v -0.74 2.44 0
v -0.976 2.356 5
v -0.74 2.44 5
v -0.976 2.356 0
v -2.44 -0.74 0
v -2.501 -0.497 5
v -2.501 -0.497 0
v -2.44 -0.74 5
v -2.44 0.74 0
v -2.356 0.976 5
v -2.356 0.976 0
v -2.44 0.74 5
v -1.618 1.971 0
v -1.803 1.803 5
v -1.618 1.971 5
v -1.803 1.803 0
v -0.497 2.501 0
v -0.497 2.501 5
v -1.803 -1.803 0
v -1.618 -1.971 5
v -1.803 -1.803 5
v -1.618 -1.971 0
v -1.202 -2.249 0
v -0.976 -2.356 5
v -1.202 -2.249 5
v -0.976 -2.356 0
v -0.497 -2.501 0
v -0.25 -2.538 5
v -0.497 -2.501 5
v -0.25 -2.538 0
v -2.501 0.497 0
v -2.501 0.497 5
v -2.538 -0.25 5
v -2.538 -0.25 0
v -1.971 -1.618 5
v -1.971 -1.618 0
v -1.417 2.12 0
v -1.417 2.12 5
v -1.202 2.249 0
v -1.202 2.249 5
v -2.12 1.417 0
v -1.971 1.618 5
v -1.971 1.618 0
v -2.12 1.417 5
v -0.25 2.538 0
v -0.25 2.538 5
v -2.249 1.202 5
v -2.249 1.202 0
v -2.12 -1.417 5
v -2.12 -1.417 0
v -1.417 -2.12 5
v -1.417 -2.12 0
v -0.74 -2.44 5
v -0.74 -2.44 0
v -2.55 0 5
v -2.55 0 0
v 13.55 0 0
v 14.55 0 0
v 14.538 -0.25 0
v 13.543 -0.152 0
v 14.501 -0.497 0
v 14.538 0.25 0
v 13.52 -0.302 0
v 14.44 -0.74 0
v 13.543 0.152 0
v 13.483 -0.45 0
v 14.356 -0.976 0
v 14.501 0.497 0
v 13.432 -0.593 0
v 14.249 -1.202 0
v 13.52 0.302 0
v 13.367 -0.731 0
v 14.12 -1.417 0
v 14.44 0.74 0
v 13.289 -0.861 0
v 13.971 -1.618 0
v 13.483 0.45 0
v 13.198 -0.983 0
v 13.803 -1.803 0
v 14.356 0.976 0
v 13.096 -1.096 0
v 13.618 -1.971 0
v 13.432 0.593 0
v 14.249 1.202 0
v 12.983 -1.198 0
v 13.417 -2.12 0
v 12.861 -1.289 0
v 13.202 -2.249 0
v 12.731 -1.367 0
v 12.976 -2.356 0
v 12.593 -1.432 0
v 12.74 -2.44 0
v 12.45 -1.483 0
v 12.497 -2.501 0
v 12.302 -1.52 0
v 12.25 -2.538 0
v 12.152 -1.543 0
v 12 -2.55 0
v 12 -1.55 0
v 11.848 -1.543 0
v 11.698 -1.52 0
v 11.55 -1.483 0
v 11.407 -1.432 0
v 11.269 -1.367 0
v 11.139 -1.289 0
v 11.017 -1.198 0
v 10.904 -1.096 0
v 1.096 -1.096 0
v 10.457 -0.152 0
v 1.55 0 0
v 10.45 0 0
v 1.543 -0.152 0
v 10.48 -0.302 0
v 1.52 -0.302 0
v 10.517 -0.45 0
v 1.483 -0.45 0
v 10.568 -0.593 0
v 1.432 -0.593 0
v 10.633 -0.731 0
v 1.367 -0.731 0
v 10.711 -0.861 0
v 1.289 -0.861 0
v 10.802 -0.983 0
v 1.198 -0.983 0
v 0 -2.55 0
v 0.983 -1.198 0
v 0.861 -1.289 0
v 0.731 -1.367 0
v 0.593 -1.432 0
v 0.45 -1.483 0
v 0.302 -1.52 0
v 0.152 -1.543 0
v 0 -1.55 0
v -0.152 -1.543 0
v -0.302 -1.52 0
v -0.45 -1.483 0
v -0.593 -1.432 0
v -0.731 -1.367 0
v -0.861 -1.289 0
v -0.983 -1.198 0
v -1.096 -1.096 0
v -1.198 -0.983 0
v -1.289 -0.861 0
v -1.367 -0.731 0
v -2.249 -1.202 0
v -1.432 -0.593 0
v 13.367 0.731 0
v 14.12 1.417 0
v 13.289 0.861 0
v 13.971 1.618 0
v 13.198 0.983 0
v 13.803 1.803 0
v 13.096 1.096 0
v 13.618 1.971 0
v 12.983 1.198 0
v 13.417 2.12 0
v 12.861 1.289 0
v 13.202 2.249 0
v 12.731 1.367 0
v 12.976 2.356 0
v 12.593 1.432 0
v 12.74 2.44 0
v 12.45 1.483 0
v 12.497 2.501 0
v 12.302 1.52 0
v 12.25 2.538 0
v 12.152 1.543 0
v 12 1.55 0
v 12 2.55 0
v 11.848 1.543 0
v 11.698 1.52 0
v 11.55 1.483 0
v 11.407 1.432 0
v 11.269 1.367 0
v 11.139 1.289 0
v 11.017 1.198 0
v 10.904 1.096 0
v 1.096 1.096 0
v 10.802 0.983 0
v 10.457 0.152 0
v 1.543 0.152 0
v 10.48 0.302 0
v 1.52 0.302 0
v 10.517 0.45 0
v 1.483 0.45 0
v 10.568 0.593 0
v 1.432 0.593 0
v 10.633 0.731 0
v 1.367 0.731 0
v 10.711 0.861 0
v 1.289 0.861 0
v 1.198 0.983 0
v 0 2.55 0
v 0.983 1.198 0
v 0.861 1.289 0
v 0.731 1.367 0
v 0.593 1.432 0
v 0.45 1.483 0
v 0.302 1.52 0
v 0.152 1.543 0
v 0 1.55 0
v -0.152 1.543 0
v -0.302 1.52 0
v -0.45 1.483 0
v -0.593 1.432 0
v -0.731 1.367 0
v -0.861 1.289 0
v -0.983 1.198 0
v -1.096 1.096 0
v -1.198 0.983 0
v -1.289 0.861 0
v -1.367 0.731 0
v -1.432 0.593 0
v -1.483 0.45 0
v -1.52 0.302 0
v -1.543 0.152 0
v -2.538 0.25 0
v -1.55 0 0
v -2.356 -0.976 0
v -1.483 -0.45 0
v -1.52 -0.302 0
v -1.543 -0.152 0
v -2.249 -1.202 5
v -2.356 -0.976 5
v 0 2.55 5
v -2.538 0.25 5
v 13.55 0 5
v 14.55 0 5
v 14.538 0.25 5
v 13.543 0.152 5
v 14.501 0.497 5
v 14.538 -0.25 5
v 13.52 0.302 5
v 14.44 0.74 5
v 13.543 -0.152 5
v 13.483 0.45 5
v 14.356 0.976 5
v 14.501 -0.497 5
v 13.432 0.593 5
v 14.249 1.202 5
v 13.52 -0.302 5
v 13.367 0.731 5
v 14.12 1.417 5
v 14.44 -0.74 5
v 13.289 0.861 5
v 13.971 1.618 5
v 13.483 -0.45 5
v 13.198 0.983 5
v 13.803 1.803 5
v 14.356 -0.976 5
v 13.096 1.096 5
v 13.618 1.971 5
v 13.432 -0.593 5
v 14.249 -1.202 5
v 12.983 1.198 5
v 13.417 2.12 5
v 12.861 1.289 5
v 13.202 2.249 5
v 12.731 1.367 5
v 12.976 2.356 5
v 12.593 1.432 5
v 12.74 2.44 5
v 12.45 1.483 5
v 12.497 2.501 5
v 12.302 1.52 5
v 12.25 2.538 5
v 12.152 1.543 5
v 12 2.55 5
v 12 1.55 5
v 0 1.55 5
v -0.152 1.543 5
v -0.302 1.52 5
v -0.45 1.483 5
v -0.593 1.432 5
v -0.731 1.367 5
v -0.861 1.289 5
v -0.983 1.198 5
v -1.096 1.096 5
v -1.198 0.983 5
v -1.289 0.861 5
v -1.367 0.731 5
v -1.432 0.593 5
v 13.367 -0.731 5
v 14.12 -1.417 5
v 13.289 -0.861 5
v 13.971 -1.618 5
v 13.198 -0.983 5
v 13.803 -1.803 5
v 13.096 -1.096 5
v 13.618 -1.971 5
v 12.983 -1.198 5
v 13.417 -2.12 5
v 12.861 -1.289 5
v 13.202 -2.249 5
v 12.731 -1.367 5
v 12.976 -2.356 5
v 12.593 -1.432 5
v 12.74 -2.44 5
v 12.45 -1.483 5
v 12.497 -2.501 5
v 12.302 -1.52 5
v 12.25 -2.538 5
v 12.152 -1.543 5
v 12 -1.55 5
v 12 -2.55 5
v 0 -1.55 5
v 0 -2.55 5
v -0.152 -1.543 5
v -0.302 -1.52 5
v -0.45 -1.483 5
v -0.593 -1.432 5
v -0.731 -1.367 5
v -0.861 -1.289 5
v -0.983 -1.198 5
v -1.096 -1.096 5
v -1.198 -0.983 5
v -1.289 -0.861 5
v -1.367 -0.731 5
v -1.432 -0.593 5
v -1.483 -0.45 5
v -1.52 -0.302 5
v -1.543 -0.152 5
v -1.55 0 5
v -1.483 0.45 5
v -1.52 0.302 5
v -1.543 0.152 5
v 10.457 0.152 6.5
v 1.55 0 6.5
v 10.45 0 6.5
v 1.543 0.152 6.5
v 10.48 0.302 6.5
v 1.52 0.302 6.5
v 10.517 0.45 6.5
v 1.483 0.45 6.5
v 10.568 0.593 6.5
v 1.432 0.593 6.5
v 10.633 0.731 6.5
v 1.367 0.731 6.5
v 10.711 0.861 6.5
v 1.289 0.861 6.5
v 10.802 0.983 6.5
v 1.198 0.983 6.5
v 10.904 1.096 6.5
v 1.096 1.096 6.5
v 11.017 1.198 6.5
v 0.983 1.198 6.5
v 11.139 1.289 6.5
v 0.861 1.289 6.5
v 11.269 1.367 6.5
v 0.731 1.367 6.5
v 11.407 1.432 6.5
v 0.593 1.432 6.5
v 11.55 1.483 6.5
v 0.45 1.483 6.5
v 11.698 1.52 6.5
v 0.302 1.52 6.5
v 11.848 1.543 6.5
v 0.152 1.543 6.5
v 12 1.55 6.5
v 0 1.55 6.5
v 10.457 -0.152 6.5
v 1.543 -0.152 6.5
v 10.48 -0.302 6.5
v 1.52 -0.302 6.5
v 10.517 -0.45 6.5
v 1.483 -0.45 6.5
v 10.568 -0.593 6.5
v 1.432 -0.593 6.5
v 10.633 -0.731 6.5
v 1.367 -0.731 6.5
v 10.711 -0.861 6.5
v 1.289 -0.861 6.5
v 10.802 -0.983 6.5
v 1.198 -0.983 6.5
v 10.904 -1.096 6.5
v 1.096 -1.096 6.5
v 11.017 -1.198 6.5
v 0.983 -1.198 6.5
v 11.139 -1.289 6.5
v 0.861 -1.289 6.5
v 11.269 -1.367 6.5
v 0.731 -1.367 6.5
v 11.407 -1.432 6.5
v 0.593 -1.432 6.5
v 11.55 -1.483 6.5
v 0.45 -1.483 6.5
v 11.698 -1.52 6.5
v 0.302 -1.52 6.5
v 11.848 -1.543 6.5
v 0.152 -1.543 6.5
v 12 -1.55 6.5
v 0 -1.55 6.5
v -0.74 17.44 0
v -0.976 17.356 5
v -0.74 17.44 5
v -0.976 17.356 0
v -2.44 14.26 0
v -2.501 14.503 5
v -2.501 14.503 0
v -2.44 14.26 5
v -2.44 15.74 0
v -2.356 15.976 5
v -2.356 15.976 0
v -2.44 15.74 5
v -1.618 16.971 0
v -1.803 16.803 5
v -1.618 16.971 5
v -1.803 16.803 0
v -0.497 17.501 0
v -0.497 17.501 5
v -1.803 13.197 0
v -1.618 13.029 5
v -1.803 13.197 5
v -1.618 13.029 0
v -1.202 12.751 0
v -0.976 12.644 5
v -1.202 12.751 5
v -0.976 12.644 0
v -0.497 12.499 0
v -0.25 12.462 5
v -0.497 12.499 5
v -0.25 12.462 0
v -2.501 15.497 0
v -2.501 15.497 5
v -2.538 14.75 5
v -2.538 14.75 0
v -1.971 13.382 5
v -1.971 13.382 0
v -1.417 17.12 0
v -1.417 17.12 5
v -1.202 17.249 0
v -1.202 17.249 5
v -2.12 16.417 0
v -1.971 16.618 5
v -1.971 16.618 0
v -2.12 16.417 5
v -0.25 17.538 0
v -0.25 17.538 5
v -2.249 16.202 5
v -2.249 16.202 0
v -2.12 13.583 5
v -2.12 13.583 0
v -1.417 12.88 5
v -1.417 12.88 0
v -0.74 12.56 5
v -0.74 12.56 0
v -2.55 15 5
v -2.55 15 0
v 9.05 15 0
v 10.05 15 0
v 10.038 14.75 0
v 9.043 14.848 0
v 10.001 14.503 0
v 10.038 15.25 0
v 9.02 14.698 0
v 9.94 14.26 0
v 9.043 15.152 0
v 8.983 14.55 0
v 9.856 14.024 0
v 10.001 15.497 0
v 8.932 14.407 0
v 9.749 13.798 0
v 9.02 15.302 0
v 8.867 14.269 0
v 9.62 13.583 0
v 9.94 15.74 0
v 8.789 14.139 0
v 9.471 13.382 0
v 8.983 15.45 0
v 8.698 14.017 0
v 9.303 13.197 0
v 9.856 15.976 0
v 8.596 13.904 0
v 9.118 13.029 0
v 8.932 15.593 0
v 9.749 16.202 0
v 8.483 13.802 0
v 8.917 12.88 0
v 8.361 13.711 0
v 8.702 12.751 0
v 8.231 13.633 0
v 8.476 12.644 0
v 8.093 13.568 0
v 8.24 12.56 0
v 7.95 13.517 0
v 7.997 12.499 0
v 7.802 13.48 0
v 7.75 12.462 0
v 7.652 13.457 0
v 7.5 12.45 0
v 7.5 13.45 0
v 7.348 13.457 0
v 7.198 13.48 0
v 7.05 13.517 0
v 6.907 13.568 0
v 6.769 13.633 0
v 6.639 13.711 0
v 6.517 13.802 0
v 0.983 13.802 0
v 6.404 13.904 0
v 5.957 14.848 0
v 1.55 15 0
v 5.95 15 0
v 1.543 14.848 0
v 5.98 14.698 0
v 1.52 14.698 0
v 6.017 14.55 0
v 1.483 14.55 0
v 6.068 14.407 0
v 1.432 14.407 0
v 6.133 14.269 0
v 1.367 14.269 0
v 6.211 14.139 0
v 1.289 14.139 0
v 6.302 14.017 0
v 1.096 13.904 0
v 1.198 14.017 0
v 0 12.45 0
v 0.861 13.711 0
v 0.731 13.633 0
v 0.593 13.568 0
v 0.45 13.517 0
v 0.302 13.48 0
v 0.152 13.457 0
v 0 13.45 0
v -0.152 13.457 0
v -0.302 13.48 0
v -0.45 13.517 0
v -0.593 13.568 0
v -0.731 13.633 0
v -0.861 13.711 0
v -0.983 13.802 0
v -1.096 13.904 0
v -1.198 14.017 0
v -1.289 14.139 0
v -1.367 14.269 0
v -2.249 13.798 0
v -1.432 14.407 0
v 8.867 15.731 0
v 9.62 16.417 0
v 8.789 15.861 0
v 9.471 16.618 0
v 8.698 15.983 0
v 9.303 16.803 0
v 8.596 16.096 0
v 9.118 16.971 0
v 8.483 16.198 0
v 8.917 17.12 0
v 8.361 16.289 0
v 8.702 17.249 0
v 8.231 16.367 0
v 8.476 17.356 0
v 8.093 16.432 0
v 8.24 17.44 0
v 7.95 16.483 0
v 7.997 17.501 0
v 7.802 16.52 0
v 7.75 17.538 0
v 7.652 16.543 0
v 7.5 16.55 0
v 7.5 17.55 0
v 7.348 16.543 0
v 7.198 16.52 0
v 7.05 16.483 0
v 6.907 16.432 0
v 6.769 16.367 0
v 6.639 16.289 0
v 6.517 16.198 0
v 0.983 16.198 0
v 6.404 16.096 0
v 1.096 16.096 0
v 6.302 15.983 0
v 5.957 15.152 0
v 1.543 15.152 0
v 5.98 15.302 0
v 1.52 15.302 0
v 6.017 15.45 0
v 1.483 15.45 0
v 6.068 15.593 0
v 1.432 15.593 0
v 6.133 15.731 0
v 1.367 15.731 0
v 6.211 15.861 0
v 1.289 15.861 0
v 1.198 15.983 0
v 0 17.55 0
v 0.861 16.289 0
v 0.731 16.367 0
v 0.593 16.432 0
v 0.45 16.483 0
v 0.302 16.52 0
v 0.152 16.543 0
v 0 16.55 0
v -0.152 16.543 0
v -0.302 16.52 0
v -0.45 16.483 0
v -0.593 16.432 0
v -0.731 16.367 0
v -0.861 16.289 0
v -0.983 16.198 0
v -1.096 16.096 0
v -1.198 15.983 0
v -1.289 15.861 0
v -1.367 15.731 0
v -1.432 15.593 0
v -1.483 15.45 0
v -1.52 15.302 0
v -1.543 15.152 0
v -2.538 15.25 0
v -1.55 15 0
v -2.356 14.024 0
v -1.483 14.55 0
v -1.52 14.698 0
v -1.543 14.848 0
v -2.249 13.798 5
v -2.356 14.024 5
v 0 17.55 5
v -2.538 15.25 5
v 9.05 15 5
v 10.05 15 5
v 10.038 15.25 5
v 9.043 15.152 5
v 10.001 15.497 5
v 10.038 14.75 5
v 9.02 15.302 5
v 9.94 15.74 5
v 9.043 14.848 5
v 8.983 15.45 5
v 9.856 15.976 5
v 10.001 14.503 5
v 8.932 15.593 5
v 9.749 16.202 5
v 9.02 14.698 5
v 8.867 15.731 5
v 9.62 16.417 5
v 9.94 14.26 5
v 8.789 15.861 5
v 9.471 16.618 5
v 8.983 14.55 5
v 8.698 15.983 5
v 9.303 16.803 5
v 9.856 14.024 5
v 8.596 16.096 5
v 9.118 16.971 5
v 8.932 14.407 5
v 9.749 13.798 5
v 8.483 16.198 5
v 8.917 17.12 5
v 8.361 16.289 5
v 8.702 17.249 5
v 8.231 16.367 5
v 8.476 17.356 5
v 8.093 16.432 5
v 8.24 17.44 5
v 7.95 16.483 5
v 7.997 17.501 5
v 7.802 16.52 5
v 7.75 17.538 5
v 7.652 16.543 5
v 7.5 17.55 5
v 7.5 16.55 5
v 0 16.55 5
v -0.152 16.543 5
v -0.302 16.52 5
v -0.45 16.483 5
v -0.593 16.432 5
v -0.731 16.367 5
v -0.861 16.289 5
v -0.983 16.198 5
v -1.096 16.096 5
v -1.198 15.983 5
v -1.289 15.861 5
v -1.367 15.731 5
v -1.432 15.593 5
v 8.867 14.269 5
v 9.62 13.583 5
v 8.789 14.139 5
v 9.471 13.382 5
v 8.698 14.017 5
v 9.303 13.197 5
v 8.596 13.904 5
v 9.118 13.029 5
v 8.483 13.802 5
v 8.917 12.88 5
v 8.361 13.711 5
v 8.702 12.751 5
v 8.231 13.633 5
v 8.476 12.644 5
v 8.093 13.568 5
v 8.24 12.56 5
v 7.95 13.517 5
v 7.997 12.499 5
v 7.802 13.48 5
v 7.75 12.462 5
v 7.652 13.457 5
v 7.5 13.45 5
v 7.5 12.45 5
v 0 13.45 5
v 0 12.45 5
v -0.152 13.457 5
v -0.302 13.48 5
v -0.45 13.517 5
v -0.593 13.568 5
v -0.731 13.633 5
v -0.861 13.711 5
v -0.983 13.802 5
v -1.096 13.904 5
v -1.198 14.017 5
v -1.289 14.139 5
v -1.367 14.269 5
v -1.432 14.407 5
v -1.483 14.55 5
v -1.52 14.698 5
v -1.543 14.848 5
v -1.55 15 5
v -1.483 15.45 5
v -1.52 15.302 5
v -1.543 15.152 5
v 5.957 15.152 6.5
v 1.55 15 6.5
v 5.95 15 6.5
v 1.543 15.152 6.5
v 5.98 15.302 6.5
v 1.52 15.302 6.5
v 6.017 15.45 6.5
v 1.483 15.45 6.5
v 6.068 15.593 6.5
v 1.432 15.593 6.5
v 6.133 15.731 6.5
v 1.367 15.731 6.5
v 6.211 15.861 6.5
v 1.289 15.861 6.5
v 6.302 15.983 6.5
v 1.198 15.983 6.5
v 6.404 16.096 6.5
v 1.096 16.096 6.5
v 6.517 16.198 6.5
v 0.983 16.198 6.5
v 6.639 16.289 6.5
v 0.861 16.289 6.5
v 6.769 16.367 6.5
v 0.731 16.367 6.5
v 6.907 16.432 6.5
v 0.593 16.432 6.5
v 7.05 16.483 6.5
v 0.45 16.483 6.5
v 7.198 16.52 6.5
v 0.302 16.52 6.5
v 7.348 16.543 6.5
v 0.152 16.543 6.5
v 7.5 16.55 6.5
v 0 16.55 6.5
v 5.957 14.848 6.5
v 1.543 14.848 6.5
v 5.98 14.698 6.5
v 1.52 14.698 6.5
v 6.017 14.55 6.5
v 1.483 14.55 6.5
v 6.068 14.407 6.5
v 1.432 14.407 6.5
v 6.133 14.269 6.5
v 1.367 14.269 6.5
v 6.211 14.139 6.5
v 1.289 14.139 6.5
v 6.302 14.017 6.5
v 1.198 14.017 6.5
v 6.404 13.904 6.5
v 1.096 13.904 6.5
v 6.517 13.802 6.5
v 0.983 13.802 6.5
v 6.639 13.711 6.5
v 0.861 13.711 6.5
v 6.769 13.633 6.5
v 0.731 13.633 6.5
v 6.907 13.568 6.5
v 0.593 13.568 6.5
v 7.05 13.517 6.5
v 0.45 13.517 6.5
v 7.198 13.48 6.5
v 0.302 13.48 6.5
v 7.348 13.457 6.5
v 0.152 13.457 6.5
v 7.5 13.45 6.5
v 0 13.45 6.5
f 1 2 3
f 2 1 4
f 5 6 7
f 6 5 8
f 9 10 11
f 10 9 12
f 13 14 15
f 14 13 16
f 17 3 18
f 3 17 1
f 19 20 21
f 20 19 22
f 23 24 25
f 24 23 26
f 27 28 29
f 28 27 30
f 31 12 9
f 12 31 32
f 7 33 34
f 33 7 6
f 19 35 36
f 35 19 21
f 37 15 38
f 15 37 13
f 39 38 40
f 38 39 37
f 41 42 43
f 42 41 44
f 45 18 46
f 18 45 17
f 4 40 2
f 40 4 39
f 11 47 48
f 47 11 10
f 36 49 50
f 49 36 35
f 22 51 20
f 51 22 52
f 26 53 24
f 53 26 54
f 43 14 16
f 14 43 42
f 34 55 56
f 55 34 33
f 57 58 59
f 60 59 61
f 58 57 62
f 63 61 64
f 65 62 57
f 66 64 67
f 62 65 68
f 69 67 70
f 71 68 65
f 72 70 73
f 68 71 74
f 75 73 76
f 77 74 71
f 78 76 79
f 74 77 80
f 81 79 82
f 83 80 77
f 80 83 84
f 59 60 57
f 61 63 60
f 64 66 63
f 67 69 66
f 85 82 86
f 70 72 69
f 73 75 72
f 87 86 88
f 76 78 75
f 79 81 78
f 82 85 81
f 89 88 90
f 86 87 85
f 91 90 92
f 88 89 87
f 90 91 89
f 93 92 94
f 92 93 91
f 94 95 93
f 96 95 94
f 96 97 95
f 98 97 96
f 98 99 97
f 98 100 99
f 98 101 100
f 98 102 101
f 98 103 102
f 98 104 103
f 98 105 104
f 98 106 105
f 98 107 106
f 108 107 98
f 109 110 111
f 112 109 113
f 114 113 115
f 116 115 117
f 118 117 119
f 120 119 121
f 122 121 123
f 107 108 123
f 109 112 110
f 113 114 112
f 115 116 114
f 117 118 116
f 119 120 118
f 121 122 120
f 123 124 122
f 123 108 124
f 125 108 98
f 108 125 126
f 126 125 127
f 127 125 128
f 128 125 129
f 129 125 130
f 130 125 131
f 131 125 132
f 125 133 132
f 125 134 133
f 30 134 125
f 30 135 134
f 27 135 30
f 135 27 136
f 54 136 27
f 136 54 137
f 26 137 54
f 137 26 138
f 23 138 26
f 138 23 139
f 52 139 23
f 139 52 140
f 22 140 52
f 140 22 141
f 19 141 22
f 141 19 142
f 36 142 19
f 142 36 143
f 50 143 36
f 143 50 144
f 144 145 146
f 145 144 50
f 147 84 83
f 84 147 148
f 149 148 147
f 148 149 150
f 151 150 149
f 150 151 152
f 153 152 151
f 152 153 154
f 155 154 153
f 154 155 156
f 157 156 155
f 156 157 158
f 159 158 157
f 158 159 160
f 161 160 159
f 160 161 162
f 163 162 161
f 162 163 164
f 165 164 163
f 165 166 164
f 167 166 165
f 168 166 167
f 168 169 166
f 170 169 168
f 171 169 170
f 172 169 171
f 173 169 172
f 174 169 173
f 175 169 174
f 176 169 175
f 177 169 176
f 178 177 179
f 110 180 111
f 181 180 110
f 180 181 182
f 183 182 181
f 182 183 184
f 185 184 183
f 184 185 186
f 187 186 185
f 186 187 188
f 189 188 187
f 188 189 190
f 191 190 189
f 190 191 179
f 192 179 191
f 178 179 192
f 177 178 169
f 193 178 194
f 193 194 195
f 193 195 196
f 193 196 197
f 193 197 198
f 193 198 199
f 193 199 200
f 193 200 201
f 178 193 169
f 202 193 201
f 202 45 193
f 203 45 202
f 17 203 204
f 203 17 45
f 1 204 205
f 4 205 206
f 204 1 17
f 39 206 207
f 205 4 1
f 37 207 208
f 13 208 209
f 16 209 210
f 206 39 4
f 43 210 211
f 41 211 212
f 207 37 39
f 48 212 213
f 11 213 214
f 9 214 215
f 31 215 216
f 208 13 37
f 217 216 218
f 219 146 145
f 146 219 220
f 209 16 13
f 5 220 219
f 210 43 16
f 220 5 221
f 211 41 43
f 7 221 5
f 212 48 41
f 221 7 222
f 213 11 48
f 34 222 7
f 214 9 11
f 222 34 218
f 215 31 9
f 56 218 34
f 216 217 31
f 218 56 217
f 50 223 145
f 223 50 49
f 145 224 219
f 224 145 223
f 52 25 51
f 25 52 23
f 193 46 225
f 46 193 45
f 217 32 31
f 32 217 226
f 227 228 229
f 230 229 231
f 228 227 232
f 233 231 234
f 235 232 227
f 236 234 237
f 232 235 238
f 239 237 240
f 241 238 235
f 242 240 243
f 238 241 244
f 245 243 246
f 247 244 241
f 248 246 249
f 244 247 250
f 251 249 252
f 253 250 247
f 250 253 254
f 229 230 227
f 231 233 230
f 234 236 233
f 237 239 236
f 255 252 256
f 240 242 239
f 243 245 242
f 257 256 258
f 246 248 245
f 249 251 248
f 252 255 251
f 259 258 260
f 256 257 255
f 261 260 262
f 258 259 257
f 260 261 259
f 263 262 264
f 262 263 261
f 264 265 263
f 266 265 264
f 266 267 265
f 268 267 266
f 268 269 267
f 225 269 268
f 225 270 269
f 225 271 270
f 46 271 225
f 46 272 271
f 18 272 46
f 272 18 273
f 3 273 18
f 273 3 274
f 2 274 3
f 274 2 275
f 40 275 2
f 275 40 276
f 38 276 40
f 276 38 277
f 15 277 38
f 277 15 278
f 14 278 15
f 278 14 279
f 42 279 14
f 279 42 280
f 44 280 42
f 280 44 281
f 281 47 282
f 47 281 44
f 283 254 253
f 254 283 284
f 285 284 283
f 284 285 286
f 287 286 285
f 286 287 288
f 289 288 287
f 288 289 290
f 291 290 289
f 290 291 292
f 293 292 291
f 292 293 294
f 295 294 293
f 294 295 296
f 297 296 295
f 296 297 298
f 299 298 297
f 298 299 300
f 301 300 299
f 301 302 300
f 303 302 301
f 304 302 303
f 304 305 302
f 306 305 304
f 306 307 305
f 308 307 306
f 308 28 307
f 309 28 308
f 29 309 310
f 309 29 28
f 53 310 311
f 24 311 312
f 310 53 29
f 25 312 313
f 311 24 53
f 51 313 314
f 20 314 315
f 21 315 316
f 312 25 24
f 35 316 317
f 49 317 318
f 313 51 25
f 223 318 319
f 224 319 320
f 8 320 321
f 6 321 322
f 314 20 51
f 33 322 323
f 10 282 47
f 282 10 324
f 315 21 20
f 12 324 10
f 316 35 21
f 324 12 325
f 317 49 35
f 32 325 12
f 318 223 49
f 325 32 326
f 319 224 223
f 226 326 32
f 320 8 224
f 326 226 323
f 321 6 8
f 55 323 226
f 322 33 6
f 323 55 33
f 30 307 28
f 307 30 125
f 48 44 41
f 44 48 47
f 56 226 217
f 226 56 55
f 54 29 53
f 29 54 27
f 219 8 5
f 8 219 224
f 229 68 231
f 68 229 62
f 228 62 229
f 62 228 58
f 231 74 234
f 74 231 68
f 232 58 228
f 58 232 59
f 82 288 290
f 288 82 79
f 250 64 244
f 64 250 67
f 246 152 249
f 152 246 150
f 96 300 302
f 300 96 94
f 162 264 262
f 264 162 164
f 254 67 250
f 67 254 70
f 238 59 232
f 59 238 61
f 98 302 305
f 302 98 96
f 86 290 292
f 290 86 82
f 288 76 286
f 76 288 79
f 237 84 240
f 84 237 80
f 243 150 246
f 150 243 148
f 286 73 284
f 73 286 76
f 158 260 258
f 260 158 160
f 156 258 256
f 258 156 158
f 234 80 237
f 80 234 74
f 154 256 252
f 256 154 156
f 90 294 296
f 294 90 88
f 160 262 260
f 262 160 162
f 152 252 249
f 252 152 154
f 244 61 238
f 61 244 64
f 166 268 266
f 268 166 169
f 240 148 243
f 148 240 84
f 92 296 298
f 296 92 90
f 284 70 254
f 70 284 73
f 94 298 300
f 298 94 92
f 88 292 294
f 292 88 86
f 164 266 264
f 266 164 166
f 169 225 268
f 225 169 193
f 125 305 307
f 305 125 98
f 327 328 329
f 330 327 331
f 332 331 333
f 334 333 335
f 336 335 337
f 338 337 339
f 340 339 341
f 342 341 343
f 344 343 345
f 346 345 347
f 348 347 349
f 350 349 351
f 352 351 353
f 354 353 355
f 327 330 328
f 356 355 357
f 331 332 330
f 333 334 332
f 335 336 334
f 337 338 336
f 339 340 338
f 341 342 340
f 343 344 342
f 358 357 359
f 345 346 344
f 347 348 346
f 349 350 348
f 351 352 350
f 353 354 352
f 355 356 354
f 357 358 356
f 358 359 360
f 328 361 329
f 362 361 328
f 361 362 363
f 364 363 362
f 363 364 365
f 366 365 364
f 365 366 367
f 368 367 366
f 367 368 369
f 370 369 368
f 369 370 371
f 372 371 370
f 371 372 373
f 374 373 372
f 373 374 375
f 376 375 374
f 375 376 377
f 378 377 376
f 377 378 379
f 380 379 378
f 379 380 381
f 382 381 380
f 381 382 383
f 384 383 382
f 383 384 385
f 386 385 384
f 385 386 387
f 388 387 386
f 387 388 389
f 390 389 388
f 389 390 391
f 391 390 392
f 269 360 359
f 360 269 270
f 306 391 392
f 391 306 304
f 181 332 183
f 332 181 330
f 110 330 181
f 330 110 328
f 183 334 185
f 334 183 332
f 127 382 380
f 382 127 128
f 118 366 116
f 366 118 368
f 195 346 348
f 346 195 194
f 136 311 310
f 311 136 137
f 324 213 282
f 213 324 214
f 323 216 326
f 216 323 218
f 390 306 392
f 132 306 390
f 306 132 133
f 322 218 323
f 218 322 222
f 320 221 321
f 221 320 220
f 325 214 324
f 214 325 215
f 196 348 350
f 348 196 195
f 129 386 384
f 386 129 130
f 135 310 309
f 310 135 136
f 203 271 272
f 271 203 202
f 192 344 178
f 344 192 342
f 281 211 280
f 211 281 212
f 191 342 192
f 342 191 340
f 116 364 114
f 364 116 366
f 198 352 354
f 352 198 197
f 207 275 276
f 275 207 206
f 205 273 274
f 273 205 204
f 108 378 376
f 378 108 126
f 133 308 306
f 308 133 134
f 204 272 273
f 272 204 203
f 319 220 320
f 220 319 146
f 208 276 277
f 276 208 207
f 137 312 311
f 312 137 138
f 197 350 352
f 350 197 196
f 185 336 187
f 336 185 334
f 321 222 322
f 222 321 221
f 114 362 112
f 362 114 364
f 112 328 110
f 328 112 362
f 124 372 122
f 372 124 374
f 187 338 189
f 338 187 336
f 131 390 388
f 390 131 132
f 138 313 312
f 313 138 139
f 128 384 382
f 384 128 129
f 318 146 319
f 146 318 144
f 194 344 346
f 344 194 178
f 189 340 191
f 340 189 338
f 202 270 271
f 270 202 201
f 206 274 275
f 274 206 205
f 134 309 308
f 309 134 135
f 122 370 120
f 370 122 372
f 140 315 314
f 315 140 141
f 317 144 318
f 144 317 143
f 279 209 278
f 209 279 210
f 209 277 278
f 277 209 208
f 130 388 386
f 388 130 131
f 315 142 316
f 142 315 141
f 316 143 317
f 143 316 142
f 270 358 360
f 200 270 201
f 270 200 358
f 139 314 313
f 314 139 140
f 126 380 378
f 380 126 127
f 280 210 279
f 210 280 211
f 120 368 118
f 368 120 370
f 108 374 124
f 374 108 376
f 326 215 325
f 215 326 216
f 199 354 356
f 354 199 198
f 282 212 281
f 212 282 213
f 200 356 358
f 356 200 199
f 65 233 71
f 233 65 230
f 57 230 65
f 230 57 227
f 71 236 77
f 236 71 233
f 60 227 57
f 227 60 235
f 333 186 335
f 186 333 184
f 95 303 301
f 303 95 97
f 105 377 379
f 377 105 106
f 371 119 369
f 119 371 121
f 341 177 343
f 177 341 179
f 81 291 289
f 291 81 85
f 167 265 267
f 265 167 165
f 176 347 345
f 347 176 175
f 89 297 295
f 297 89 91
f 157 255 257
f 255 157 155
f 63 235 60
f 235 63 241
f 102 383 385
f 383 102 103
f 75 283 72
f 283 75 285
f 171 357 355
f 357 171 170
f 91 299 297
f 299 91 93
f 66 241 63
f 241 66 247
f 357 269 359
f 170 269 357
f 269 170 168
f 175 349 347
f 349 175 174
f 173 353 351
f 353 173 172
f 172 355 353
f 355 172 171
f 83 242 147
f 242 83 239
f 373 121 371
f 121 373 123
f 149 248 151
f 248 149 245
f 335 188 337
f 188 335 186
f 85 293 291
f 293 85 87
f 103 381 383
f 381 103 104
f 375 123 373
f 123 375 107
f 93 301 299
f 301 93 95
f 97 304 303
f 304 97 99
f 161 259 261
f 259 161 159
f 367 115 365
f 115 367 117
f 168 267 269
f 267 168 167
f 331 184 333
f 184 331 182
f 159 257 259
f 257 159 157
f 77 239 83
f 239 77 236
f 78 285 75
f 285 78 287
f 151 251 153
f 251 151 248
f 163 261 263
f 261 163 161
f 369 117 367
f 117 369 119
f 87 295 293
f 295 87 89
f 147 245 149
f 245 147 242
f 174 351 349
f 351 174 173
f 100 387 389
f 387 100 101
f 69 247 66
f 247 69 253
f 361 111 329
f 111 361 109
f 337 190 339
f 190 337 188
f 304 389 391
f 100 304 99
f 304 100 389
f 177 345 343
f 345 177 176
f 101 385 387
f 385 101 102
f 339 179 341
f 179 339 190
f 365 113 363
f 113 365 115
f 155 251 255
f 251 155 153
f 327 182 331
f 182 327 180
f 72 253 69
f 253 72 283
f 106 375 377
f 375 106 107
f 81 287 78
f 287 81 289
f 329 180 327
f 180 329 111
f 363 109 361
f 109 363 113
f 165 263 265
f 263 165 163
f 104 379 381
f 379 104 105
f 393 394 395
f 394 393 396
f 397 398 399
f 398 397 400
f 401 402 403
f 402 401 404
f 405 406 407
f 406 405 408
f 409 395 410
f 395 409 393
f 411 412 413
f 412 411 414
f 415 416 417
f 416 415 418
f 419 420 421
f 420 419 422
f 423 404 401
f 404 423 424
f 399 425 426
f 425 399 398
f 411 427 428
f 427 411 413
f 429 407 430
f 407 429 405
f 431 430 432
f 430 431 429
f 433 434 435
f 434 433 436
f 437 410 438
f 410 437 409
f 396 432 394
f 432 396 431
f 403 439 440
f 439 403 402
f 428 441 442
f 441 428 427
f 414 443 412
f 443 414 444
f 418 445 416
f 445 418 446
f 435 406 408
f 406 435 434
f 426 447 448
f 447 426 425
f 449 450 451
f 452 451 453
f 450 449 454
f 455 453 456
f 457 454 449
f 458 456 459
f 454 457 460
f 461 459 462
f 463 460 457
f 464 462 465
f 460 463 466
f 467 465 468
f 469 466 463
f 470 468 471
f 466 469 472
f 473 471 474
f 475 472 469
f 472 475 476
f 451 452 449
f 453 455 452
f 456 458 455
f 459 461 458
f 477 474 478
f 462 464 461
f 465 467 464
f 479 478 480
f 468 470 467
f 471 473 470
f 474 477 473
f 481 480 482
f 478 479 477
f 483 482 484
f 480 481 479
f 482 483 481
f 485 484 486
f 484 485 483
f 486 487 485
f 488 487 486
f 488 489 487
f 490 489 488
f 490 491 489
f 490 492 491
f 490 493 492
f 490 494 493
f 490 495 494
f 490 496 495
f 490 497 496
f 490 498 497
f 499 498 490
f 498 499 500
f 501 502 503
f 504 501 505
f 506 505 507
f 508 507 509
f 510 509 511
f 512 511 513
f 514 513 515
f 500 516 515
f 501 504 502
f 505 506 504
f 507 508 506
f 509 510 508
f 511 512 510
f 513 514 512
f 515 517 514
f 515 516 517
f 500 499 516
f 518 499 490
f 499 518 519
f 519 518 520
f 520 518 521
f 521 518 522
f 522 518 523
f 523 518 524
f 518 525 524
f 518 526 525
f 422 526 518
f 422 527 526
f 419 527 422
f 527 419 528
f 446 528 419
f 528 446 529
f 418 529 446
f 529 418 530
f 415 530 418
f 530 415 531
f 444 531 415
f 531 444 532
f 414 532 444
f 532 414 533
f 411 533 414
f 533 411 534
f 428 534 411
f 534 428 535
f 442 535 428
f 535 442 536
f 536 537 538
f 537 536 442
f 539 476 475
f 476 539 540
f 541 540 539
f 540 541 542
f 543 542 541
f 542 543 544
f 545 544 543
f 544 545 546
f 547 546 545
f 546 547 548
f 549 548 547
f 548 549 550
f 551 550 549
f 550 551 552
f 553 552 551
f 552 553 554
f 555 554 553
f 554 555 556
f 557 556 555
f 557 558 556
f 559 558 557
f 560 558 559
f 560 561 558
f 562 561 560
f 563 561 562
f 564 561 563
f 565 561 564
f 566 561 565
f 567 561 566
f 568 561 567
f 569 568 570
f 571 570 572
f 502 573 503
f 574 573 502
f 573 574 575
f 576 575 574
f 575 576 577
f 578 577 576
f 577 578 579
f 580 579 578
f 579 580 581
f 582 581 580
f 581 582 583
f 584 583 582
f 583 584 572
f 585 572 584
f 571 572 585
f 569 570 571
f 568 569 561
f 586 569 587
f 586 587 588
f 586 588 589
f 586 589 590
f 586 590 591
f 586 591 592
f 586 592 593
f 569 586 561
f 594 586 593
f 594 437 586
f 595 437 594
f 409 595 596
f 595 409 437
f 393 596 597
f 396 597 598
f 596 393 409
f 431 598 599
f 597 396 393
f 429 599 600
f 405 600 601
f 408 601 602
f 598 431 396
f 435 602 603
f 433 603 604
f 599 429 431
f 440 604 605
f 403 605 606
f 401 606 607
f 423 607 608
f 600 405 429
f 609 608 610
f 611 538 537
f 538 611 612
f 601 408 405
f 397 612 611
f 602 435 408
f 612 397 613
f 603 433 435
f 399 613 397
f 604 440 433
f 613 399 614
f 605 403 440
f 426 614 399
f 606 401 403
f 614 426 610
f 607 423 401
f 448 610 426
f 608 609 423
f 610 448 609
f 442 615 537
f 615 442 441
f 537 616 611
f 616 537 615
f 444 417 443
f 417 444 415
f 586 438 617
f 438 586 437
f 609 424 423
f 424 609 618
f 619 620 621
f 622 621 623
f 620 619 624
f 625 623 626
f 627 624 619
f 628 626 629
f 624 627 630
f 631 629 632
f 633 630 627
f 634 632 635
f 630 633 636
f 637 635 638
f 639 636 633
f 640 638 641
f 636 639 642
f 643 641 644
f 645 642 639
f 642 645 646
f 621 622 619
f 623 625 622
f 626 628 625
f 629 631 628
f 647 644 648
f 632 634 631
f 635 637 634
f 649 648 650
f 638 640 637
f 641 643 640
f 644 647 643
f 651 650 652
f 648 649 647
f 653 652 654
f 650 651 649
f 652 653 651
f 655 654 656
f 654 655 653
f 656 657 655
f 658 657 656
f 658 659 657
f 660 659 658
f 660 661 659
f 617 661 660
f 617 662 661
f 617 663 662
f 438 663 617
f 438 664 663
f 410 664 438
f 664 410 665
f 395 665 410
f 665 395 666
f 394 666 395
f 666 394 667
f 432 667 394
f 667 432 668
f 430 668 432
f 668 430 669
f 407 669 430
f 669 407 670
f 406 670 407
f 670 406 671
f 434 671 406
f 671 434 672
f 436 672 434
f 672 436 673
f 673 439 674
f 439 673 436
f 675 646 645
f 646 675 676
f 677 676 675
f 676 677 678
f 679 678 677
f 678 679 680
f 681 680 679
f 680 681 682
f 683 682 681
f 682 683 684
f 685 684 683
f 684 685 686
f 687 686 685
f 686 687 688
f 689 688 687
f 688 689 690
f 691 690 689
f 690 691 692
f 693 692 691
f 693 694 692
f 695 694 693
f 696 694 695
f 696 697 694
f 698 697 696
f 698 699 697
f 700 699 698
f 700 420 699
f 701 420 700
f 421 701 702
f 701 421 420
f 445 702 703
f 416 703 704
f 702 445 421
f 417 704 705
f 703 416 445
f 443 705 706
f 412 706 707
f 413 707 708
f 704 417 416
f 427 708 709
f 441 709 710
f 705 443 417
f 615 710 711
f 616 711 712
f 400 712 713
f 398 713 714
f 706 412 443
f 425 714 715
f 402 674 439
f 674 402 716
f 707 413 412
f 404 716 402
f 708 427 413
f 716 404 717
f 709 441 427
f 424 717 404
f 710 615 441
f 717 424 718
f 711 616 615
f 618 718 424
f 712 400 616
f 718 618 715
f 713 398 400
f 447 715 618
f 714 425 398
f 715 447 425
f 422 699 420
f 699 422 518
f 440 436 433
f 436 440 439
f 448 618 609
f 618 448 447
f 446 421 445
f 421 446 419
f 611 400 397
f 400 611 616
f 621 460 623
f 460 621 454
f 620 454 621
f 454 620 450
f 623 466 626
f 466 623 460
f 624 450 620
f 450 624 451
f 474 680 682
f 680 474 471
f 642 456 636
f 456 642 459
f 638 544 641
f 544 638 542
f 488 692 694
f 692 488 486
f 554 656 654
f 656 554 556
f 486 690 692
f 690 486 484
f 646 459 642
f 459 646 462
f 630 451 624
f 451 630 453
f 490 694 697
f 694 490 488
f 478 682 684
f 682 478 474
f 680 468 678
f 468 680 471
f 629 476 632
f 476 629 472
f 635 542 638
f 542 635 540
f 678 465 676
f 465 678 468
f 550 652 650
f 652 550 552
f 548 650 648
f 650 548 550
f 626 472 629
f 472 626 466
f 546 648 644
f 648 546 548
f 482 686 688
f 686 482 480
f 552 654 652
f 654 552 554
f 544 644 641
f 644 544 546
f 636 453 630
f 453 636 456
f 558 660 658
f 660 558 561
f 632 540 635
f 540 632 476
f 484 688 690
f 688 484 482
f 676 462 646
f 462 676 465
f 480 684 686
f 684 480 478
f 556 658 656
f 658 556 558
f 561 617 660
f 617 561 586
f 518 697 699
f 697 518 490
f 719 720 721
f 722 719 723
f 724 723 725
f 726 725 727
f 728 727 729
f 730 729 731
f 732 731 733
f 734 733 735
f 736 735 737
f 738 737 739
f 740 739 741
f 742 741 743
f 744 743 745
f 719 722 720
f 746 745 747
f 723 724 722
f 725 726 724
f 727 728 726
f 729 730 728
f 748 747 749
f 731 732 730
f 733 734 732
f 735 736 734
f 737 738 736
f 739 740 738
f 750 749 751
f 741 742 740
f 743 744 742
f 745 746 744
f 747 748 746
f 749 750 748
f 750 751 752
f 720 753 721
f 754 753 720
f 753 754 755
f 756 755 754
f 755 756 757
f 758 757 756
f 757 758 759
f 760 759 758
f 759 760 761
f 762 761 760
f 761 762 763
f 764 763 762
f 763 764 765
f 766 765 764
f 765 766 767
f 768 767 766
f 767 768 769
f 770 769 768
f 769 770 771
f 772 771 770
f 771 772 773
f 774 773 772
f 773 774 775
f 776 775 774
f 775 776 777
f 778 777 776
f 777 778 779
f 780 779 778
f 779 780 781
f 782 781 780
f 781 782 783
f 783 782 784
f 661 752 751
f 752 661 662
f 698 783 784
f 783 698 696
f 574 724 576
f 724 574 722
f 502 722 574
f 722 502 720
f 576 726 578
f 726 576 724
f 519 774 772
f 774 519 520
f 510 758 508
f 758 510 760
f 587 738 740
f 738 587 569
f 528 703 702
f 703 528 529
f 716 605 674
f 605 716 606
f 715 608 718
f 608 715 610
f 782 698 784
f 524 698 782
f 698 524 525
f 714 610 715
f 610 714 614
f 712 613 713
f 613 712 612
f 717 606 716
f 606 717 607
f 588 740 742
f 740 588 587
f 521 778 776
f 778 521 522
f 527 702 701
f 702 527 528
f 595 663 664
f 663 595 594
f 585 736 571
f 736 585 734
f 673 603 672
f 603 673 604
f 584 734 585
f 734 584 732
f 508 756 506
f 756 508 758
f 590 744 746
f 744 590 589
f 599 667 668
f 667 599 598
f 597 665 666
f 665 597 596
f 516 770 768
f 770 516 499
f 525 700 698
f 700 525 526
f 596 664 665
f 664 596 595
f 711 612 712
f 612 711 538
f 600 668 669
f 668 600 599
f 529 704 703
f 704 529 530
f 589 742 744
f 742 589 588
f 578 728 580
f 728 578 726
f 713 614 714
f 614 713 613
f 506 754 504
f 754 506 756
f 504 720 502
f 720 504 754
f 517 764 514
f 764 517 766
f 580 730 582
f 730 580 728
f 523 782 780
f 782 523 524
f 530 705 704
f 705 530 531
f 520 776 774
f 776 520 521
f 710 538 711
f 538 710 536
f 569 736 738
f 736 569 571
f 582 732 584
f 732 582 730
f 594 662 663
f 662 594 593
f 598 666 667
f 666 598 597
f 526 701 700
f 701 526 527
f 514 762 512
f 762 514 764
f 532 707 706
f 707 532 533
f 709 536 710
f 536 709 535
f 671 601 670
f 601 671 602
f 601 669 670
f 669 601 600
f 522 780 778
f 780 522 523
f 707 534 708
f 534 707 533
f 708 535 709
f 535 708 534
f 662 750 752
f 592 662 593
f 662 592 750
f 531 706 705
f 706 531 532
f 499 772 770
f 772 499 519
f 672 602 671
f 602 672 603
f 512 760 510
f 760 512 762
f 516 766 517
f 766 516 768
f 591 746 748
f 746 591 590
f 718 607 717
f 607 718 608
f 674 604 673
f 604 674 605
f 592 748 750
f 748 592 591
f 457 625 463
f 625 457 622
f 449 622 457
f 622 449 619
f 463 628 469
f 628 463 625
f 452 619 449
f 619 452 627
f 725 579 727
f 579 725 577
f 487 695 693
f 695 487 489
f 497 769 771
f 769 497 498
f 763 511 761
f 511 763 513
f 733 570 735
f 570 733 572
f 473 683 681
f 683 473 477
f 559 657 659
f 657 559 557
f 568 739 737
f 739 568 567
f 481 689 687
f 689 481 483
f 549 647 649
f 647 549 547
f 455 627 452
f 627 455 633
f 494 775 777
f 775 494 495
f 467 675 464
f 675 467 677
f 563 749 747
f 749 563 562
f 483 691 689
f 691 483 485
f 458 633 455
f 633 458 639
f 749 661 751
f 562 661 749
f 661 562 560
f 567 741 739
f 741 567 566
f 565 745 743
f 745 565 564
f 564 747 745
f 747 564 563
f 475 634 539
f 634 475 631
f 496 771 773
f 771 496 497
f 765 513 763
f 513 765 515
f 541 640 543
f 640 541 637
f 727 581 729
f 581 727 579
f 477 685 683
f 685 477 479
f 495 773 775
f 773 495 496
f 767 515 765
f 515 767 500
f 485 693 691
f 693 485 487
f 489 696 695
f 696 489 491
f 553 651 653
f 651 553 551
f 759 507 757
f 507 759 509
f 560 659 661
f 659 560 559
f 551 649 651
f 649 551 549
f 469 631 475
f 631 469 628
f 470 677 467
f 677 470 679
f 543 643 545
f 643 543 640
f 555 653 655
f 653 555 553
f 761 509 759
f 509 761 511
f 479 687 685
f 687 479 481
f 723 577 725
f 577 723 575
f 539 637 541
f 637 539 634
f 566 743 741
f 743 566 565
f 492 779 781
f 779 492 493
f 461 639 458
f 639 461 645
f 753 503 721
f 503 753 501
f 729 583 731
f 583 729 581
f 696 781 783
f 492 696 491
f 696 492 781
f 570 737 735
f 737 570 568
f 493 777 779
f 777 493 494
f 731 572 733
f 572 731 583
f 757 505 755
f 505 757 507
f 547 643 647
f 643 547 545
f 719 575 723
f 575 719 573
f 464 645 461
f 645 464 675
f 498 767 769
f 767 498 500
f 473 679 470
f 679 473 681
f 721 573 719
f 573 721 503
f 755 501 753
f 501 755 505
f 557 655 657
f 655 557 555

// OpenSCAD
// file: roundedcube.scad
module roundedcube(size = [1, 1, 1], center = false, radius = 0.5, apply_to = "all") {
	// If single value, convert to [x, y, z] vector
	size = (size[0] == undef) ? [size, size, size] : size;

	translate_min = radius;
	translate_xmax = size[0] - radius;
	translate_ymax = size[1] - radius;
	translate_zmax = size[2] - radius;

	diameter = radius * 2;

	module build_point(type = "sphere", rotate = [0, 0, 0]) {
		if (type == "sphere") {
			sphere(r = radius);
		} else if (type == "cylinder") {
			rotate(a = rotate)
			cylinder(h = diameter, r = radius, center = true);
		}
	}

	obj_translate = (center == false) ?
		[0, 0, 0] : [
			-(size[0] / 2),
			-(size[1] / 2),
			-(size[2] / 2)
		];

	translate(v = obj_translate) {
		hull() {
			for (translate_x = [translate_min, translate_xmax]) {
				x_at = (translate_x == translate_min) ? "min" : "max";
				for (translate_y = [translate_min, translate_ymax]) {
					y_at = (translate_y == translate_min) ? "min" : "max";
					for (translate_z = [translate_min, translate_zmax]) {
						z_at = (translate_z == translate_min) ? "min" : "max";

						translate(v = [translate_x, translate_y, translate_z])
						if (
							(apply_to == "all") ||
							(apply_to == "xmin" && x_at == "min") || (apply_to == "xmax" && x_at == "max") ||
							(apply_to == "ymin" && y_at == "min") || (apply_to == "ymax" && y_at == "max") ||
							(apply_to == "zmin" && z_at == "min") || (apply_to == "zmax" && z_at == "max")
						) {
							build_point("sphere");
						} else {
							rotate = 
								(apply_to == "xmin" || apply_to == "xmax" || apply_to == "x") ? [0, 90, 0] : (
								(apply_to == "ymin" || apply_to == "ymax" || apply_to == "y") ? [90, 90, 0] :
								[0, 0, 0]
							);
							build_point("cylinder", rotate);
						}
					}
				}
			}
		}
	}
}
// file: pi-holes.scad
//Shut your Pi Hole! 
//An OpenSCAD library to assist with designing Raspberry Pi accessories

//This work is licensed under the Creative Commons Attribution-ShareAlike 4.0 International License. To view a copy of this license, visit http://creativecommons.org/licenses/by-sa/4.0/.
//© 2016 Dale Price

//Pi dimensions sourced from https://www.raspberrypi.org/documentation/hardware/raspberrypi/mechanical/
//Currently supports "1B", "1A+", "1B+", "2B", "3B", "Zero"

//Pi hole diameter plus a tiny bit extra to account for shrinkage when 3D printing
piHoleD = 2.9;


//get vector of [x,y] vectors of locations of mounting holes based on Pi version
function piHoleLocations (board="3B") = 
	(board=="1A+" || board=="1B+" || board=="2B" || board=="3B") ?
		[[3.5, 3.5], [61.5, 3.5], [3.5, 52.5], [61.5, 52.5]] : //pi 1B+, 2B, 3B
	(board=="Zero") ?
		[[3.5, 3.5], [61.5, 3.5], [3.5, 26.5], [61.5, 26.5]] : //pi zero
	(board=="1B") ?
		[[80, 43.5], [25, 17.5]] :
	[]; //invalid board

//get vector of [x,y,z] dimensions of board
//	dimensions are for PCB only, not ports or anything else
function piBoardDim (board="3B") =
	(board=="1B" || board=="1B+" || board=="2B" || board=="3B") ?
		[85, 56, 1.25] :
	(board=="Zero") ?
		[65, 30, 1.25] :
	(board == "1A+") ?
		[65, 56, 1.25] :
	[0,0,0];

//Mounting holes for a Raspberry Pi of the specified version
//	Parameters
//		board: the version of the raspberry pi to generate holes for
//		depth: the depth of the holes in mm
module piHoles (board, depth = 5, preview=true) {
	//preview of the board itself
	if(preview==true)
		% piBoard(board);
	
	//mounting holes
	for(holePos = piHoleLocations(board)) {
		translate([holePos[0], holePos[1], -depth]) cylinder(d=piHoleD + 0.1, h=2*depth);
	}
}

//Preview of board dimensions for Raspberry Pi of the specified version
module piBoard (board) {
	difference() {
		cube(piBoardDim(board), center=false);
		translate([0,0,piBoardDim(board)[2] + 0.01]) piHoles(board, piBoardDim(board)[2] + 0.02, false);
	}

	//warn about possible inaccuracy of boards that don't currently have official documentation
	if(board == "1B") {
		echo("CAUTION: The mounting hole positions for the board you have selected may not be accurate because the Raspberry Pi Foundation does not currently provide official mechanical drawings for it.");
	}
}

//Snap-fit posts for mounting the Raspberry Pi
//	Parameters
//		board: version of the raspberry pi to mount
//		height: height of the top surface of the raspberry pi board off the base of the posts
//		preview: whether or not to show a preview of the board in place
module piPosts(board, height=5, preview=true) {
	piSize = piBoardDim(board);
	piHolePos = piHoleLocations(board);

	module pcbPost(height) {
		cylinder(d=2, h=height);
		cylinder(d1=5, d2=2, h=height - piSize[2] - 0.25);

		translate([0, 0.4, height]) scale([1.1, 1.1, 1]) cylinder(d=2, h=0.5);
	}
	
	for(holePos = piHolePos) {
		translate([holePos[0], holePos[1], 0]) pcbPost(height);
	}

	if(preview==true)
		% translate([0,0,height-piSize[2]]) piBoard(board);
}

//Generic stands of arbitrary height
//	Parameters
//		height: stand height
module pcbStand(height) {
	difference() {
		cylinder(d=7, h=height);
		translate([0, 0, -1]) cylinder(d=piHoleD + 0.42, h=height+2);
	}
}

//Pass-through stands for mounting the Raspberry Pi
//	Parameters
//		board: version of the raspberry pi to mount
//		height: height of the top surface of the raspberry pi board off the base of the posts
//		preview: whether or not to show a preview of the board in place
module piStands(board, height=5, preview=true) {
	piSize = piBoardDim(board);
	piHolePos = piHoleLocations(board);

	for(holePos = piHolePos) {
		translate([holePos[0], holePos[1], 0]) pcbStand(height);
	}

	if(preview==true)
		% translate([0,0,height-piSize[2]]) piBoard(board);
}

//baseplate (or top cover) for board enclosure
//	ext is the added dimension in mm
//	h is the thickness in mm
module piPlate (board="3B", ext=4, h=2) {
	let (
		base=[
			piBoardDim(board)[0] + ext * 2,
			piBoardDim(board)[1] + ext * 2,
			h
		],
		bh = piBoardDim(board)[2]
	)
	difference() {
		translate([-ext,-ext,-h]) cube(base, center=false);
		translate([0,0,1]) piHoles(board, h + 2, false);
	}

	//warn about possible inaccuracy of boards that don't currently have official documentation
	if(board == "1B") {
		echo("CAUTION: The mounting hole positions for the board you have selected may not be accurate because the Raspberry Pi Foundation does not currently provide official mechanical drawings for it.");
	}
}


//walls on baseplate for board enclosure
//	ext is the added dimension in mm
//	thick is the thickness in mm (inwards)
//	h is the height in mm
//	if top > 0 consider this a top cover and extend walls down from "top"
module piPlateWalls(board="3B", ext=4, thick=2, h=10, top=0) {
	outer=[
		piBoardDim(board)[0] + ext * 2,
		piBoardDim(board)[1] + ext * 2,
		h
	];
	inner=[
		piBoardDim(board)[0] + (ext - thick) * 2,
		piBoardDim(board)[1] + (ext - thick) * 2,
		h + 2
	];
	dh = top > 0 ? (h + top) : 0;
	translate([0, 0, -dh]) difference() {
		translate([-ext,-ext,0]) cube(outer, center=false);
		translate([-(ext - thick),-(ext - thick),-1]) cube(inner, center=false);;
	}
}

//partial walls on baseplate for board enclosure
//	ext is the added dimension in mm
//	thick is the thickness in mm (inwards)
//	size is the corner space to skip in mm
//	h is the height in mm
//	if top > 0 consider this a top cover and extend walls down from "top"
module piPlatePartialWalls(board="3B", ext=4, thick=2, h=10, size=10, top=0) {
	innerX=[
		piBoardDim(board)[0] + (ext * 2) - (size * 2),
		piBoardDim(board)[1] + (ext * 2) + 2,
		h + 2
	];
	innerY=[
		piBoardDim(board)[0] + (ext * 2) + 2,
		piBoardDim(board)[1] + (ext * 2) - (size * 2),
		h + 2
	];
	dh = top > 0 ? (h + top) : 0;
	translate([0, 0, -dh]) intersection() {
		piPlateWalls(board, ext, thick, h);
		union() {
			translate([size-ext,-ext-1,-1]) cube(innerX, center=false);
			translate([-ext-1,size-ext,-1]) cube(innerY, center=false);
		}
	}
}

//corners on baseplate for board enclosure
//	ext is the added dimension in mm
//	thick is the thickness in mm (inwards)
//	h is the height in mm
//	size is the corner size in mm
//	if top > 0 consider this a top cover and extend walls down from "top"
module piPlateCorners(board="3B", ext=4, thick=2, h=10, size=10, top=0) {
	innerX=[
		piBoardDim(board)[0] + (ext * 2) - (size * 2),
		piBoardDim(board)[1] + (ext * 2) + 2,
		h + 2
	];
	innerY=[
		piBoardDim(board)[0] + (ext * 2) + 2,
		piBoardDim(board)[1] + (ext * 2) - (size * 2),
		h + 2
	];
	dh = top > 0 ? (h + top) : 0;
	translate([0, 0, -dh]) difference() {
		piPlateWalls(board, ext, thick, h);
		{
			translate([size-ext,-ext-1,-1]) cube(innerX, center=false);
			translate([-ext-1,size-ext,-1]) cube(innerY, center=false);
		}
	}
}

color("DarkGreen", 1, $fn=20) {
	piBoard("1B");
	translate([100,0,0]) piBoard("1A+");
	translate([0,80,0]) piBoard("2B");
	translate([100,80,0]) piBoard("Zero");
}
// file: parts.scad
use <pi-holes.scad>
use <roundedcube.scad>

hInner = 27;
hBase = 4;
hPiStand = 5;

hTop = 4;
hInnerStep = 2;
corner = 8;
extIn = 2;
extOut = 2;
extSpace = 2;
extAll = extIn + extOut;
extAllSpace = extAll + extSpace;
thick = 2;

hPiBoard = 1.25;

hTunerStand = 10.5;
hTunerTop = (hInner - (hPiStand + hTunerStand + hPiBoard + hPiBoard));
hPiTopStand = (hInner - (hPiStand + hPiBoard));

hCaseSpacer = 20;

hBetweenCases = 25;

module piBase(board="3B") {
    piPlate(board, ext = extAllSpace, h = thick);
    piStands(board, height=hPiStand, preview=false);
    piPlatePartialWalls(board=board, ext=extAllSpace, thick=extOut, h=hBase, size=corner, top=0);
    piPlatePartialWalls(board=board, ext=extAllSpace-extSpace, thick=extOut, h=hBase-hInnerStep, size=corner-extOut, top=0);
    piPlateCorners(board=board, ext=extAllSpace, thick=extOut, h=hInner, size=corner, top=0);
}

module piTop(board="3B") {
    piPlate(board, ext = extAllSpace, h = thick);
    piPlatePartialWalls(board=board, ext=extAllSpace, thick=extOut, h=hTop, size=corner, top=2);
    piPlatePartialWalls(board=board, ext=extAllSpace-extSpace, thick=extIn, h=hTop-hInnerStep, size=corner-extOut, top=2);
    piPlateCorners(board=board, ext=extAllSpace-extOut, thick=extIn, h=hInner, size=corner-2.1, top=2);
}

module piBase3B() {
    diskX = 10;
    diskW = 3;
    diskD = hBase - 0.5;

    difference() {
        piBase("3B");
        translate([diskX, -30, hBase - diskD]) cube([diskW, 100, diskD + 1]);
        translate([piBoardDim("3B")[0] - (diskX + diskW), -30, hBase - diskD]) cube([diskW, 100, diskD + 1]);
    }

}

module piTop3B() {
    board = "3B";
    hole = 15;
    dx = piBoardDim(board)[0];
    dy = piBoardDim(board)[1];
    dyZero = piBoardDim("Zero")[1];

    antennaHoleD = 3;
    antennaX = 65;
    antennaY0 = 12;
    antennaY1 = antennaY0 - 7.5;
    antennaDX = 10;
    antennaDY = 8;

    fanHoleD = 3;
    fanD = 24;
    fanR = fanD / 2;
    fanCross = 3;
    fanX = 39;
    fanY = 16;

    translate([fanX, fanY, -thick/2]) cube([fanD, fanCross, thick], true);
    translate([fanX, fanY, -thick/2]) cube([fanCross, fanD, thick], true);

    difference() {
        piTop(board);
        union() {
            translate([antennaDX, antennaDY, -25]) cylinder(d=antennaHoleD, 50);
            translate([antennaDX, antennaDY + antennaY0, -25]) cylinder(d=antennaHoleD, 50);
            translate([antennaDX + antennaX, antennaDY + antennaY0, -25]) cylinder(d=antennaHoleD, 50);
            translate([antennaDX + antennaX, antennaDY + antennaY1, -25]) cylinder(d=antennaHoleD, 50);

            translate([fanX, fanY, -25]) cylinder(d=fanD, 50);
            translate([fanX + fanR, fanY + fanR, -25]) cylinder(d=fanHoleD, 50);
            translate([fanX - fanR, fanY + fanR, -25]) cylinder(d=fanHoleD, 50);
            translate([fanX + fanR, fanY - fanR, -25]) cylinder(d=fanHoleD, 50);
            translate([fanX - fanR, fanY - fanR, -25]) cylinder(d=fanHoleD, 50);

            translate([0,piBoardDim("3B")[1] - piBoardDim("Zero")[1],0]) piHoles("Zero", 50, false);
            //translate([1 * dx / 4, dy / 2, 0]) roundedcube(size = hole, center = true, radius = 3);
            //translate([3 * dx / 4, dy / 2, 0]) roundedcube(size = hole, center = true, radius = 3);

            rotate([0,90,0]) translate([8.8, dyZero / 2, dx]) cylinder(d=9.5, 20, center=true);
        }
    }
}

module piBaseZero() {
    board = "Zero";
    hole = 15;
    dx = piBoardDim(board)[0];
    dy = piBoardDim(board)[1];

    difference() {
        piBase(board);
        union() {
            translate([1 * dx / 4, dy / 2, 0]) roundedcube(size = hole, center = true, radius = 3);
            translate([3 * dx / 4, dy / 2, 0]) roundedcube(size = hole, center = true, radius = 3);
        }
    }
}

module piTopZero() {
    board = "Zero";
    hole = 15;
    dx = piBoardDim(board)[0];
    dy = piBoardDim(board)[1];

    difference() {
        piTop(board);
        union() {
            translate([1 * dx / 4, dy / 2, 0]) roundedcube(size = hole, center = true, radius = 3);
            translate([3 * dx / 4, dy / 2, 0]) roundedcube(size = hole, center = true, radius = 3);
            rotate([0,90,0]) translate([8.8, dy / 2, dx]) cylinder(d=9.5, 20, center=true);
        }
    }
}

module tunerStand() {
    pcbStand(hTunerStand);
}

module tunerTop() {
    pcbStand(hTunerTop);
}

module piTopStand() {
    pcbStand(hPiTopStand);
}

module caseSpacer() {
    pcbStand(hCaseSpacer);
}

module caseSpacerCutDown() {
    difference() {
        pcbStand(hCaseSpacer - 3.01);
        translate([-5, 0.9, 4]) cube([10, 10, 13]);
    }
}
module caseSpacerCutUp() {
    pcbStand(3);
}

module topHanger() {
    board = "Zero";
	piHolePos = piHoleLocations(board);
    h = 4;
    hole = 15;
    dx = piBoardDim(board)[0];
    dy = piBoardDim(board)[1];

    support_w = 10;
    support_gap = 4;
    support_hw = 3;
    support_hl = 2;
    support_h_gap = support_gap - support_hl;
    support_base = 35;
    support_l = support_base + support_gap + support_gap;

    module support() {
        difference() {
            cube([support_w, support_l, h], center=false);
            union() {
                translate([support_w / 2, support_h_gap + (support_hl / 2), h / 2]) cube([support_hw, support_hl, h * 2], center=true);
                translate([support_w / 2, support_base + support_gap + (support_hl / 2), h / 2]) cube([support_hw, support_hl, h * 2], center=true);
            }
        }
    }

    difference() {
        union() {
            cube([piBoardDim(board)[0], piBoardDim(board)[1], h], center=false);
            translate([0, -support_l, 0]) support();
            translate([piBoardDim(board)[0] - support_w, -support_l, 0]) support();
        }
        union() {
            translate([0,0,piBoardDim(board)[2] + 0.01]) piHoles(board, 20 + 0.02, false);
            translate([1 * dx / 4, dy / 2, 0]) roundedcube(size = hole, center = true, radius = 3);
            translate([3 * dx / 4, dy / 2, 0]) roundedcube(size = hole, center = true, radius = 3);
        }
    }
    // translate([0, 0, h]) piStands(board, height=hPiStand, preview=false);
}

module diskStand() {
    difference() {
        cylinder(d=10,6);
        translate([0,0,2]) cylinder(d=6,6);
    }
}

module antennaSpacer(distance) {
    dOut = 5.1;
    dIn = 3.1;
    thickUp = 5;
    thickIn = 1.5;
    thickHole = (thickUp + thickIn) * 2;

    difference() {
        union() {
            cylinder(d=dOut, thickUp);
            translate([distance, 0, 0]) cylinder(d=dOut, thickUp);
            translate([distance / 2, 0, thickUp / 2]) cube([distance, dOut, thickUp], center=true);
            translate([distance / 2, 0, thickUp + thickIn / 2]) cube([distance, dIn, thickIn], center=true);
        }
        union() {
            translate([0, 0, -thickHole/3]) cylinder(d=dIn, thickHole);
            translate([distance, 0, -thickHole/3]) cylinder(d=dIn, thickHole);
        }
    }
}

module antennaSpacers() {
    antennaSpacer(12);
    translate([0, 15, 0]) antennaSpacer(7.5);
}
// main file
use <parts.scad>

$fn=64;

//piBase3B();
//translate([0, 0, 35]) piTop3B();
//rotate([180, 0, 0]) piTop3B();
//piTop3B();

//piBaseZero();
//translate([0, 0, 35]) piTopZero();
//rotate([180, 0, 0]) piTopZero();

//tunerStand();
//tunerTop();
//piTopStand();
//caseSpacer();

// caseSpacerCutDown();
// translate([0, 10, 0])caseSpacerCutUp();

//topHanger();

//diskStand();

antennaSpacers();

// 4+4+30+19+32+4
// 93 * 2

// 4+4+30+19+2+7+1.5+4
// 72 * 1
// 4+4+30+19+2+4
// 63 * 1

// 4+32+4
// 40 * 2
